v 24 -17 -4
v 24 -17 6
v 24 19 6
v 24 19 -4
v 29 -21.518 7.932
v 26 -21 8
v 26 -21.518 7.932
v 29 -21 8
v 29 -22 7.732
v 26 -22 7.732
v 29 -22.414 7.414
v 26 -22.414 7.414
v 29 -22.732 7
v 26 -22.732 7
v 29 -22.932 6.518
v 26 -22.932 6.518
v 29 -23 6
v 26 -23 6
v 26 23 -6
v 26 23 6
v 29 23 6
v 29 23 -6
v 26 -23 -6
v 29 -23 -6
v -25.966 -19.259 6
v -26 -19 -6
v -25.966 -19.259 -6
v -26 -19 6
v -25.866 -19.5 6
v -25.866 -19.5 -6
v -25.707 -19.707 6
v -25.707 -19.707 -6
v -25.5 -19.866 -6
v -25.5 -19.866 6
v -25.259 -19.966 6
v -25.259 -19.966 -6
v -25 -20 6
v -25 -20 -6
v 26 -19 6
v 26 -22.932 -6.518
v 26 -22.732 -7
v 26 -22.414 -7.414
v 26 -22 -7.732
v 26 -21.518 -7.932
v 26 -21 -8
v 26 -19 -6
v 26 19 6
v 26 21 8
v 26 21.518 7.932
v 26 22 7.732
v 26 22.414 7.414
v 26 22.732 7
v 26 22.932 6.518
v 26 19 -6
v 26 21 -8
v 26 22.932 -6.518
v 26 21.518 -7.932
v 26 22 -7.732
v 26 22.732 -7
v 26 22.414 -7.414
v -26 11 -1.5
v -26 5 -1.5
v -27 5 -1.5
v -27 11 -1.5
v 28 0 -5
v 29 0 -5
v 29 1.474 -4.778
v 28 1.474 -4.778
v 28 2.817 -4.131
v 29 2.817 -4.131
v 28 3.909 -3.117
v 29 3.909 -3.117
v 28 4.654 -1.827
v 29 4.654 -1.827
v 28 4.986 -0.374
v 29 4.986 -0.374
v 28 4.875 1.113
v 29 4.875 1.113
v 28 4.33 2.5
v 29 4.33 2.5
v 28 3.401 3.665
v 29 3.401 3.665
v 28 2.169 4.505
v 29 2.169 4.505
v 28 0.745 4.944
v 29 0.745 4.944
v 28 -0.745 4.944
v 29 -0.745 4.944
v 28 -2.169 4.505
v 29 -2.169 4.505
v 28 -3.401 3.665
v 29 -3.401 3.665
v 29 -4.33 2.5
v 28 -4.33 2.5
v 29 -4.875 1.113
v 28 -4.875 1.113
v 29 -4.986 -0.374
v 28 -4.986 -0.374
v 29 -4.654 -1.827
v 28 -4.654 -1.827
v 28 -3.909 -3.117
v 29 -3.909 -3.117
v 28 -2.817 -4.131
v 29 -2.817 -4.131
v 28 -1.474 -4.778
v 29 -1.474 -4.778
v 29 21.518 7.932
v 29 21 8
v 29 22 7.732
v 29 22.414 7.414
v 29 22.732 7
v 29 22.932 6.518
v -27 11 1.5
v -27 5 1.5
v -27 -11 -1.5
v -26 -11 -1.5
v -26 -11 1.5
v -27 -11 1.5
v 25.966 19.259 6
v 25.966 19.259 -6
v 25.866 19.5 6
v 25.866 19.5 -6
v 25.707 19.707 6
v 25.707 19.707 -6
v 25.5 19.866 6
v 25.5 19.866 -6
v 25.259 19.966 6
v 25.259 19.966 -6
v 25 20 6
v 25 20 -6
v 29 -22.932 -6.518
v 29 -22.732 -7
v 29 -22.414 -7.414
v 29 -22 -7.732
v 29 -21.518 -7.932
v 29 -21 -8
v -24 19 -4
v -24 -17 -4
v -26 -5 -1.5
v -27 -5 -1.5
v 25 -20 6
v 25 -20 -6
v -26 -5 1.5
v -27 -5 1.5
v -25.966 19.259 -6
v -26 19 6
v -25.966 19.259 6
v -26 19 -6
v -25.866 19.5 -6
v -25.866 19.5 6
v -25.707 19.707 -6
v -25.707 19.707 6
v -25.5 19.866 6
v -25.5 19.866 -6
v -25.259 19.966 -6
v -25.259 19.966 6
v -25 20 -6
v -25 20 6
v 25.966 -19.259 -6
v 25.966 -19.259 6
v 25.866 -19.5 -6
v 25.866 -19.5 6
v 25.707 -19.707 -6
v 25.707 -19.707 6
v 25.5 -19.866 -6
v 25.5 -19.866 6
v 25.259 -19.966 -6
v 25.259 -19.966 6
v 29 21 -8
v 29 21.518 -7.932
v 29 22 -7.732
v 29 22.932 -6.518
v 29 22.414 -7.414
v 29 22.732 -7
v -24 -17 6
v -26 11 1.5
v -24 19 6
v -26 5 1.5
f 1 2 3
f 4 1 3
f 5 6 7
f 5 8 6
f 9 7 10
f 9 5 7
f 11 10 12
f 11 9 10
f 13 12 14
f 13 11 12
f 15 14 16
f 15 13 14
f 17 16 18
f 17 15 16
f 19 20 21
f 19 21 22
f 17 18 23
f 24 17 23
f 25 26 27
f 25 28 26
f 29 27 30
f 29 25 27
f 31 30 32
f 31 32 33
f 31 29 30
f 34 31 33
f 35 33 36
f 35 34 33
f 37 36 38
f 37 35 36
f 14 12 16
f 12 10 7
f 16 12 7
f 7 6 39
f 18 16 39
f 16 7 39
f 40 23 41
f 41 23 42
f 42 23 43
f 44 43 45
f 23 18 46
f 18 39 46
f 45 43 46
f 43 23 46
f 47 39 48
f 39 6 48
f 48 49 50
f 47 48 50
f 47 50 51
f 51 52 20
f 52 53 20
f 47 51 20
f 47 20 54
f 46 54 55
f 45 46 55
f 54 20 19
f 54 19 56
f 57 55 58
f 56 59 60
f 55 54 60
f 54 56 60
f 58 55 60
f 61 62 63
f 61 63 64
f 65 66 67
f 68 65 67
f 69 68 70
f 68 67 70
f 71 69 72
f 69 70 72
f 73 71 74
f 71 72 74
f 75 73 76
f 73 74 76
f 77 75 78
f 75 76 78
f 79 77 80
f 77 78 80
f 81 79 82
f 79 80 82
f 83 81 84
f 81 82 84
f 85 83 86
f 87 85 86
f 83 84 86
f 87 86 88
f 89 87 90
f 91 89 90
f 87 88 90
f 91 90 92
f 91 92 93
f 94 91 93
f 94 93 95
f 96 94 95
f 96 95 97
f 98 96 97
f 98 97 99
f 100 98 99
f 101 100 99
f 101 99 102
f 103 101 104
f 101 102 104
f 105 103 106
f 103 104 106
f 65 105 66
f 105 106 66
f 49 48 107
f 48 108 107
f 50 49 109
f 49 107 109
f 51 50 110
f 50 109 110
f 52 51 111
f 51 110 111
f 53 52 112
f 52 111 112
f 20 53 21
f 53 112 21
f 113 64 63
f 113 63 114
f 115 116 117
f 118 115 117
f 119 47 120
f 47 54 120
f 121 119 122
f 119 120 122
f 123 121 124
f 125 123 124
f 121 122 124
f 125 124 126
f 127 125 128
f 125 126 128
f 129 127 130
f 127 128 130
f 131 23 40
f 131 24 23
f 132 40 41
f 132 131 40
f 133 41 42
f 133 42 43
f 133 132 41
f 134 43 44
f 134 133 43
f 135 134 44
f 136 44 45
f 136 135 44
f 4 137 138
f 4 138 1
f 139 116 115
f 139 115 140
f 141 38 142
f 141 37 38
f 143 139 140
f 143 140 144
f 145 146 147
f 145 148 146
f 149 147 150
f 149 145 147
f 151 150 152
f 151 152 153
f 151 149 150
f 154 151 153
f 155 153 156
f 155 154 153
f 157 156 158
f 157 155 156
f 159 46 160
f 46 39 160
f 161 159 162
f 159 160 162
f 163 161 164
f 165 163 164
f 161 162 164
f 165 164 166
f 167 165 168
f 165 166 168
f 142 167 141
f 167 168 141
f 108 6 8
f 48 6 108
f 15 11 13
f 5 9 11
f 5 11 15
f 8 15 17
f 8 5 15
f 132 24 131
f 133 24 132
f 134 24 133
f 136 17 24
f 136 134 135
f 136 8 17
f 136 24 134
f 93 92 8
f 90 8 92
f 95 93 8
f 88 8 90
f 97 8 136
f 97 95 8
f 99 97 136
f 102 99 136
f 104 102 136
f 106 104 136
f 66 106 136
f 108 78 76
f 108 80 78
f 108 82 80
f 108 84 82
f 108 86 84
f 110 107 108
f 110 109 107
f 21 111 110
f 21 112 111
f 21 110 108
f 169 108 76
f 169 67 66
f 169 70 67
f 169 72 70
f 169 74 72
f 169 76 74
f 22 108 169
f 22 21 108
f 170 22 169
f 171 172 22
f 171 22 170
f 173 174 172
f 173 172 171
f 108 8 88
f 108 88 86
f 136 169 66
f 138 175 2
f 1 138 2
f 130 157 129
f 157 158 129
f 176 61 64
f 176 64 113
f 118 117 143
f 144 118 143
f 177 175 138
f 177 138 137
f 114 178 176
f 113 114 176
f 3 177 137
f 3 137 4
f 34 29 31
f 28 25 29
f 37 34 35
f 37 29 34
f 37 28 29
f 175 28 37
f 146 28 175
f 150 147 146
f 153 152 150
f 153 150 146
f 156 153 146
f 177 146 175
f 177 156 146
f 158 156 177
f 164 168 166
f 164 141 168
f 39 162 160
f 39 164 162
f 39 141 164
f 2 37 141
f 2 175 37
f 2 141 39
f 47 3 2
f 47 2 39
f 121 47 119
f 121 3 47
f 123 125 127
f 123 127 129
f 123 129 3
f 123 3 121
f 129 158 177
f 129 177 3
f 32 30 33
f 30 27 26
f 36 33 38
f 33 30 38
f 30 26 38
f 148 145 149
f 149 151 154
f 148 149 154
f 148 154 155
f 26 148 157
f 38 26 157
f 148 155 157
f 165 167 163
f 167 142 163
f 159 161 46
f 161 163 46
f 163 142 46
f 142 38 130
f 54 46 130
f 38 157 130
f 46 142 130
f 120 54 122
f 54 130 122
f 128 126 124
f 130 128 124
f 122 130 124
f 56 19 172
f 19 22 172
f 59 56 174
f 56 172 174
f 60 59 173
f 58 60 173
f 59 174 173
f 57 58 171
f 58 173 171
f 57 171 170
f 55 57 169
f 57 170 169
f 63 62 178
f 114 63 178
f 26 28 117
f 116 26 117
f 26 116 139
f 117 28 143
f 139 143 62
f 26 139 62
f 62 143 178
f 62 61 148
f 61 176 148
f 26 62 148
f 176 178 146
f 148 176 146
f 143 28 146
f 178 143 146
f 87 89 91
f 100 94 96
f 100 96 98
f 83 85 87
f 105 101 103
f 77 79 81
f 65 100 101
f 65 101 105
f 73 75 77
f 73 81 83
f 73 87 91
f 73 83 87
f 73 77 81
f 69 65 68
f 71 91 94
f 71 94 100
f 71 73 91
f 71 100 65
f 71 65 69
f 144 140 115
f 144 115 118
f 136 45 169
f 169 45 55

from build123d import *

# Parameters (mm, degrees)
SKETCH1_W           = 52
SKETCH1_H           = 40
BOSS_EXTRUDE1_DEPTH = 6
FILLET1_R           = 1
SKETCH2_W           = 48
SKETCH2_H           = 36
CUT_EXTRUDE1_DEPTH  = 10
SKETCH3_W           = 16
SKETCH3_H           = 46
BOSS_EXTRUDE2_DEPTH = 3
FILLET2_R           = 2
SKETCH4_R           = 5
CUT_EXTRUDE2_DEPTH  = 1
SKETCH5_W           = 3
SKETCH5_H           = 6
BOSS_EXTRUDE3_DEPTH = 1


with BuildPart() as part:
    # Sketch1 → Boss-Extrude1 (new, symmetric)
    with BuildSketch(Plane.XY):
        Rectangle(SKETCH1_W, SKETCH1_H)
    extrude(amount=BOSS_EXTRUDE1_DEPTH, both=True)

    # Fillet1
    fillet1_edges = [part.edges().sort_by_distance(p)[0] for p in [
        (-26, 20, 0),
        (26, 20, 0),
        (26, -20, 0),
        (-26, -20, 0),
    ]]
    fillet(fillet1_edges, radius=FILLET1_R)

    # Sketch2 → Cut-Extrude1 (cut)
    with BuildSketch(Plane.XY.offset(6)):
        with Locations((0, 1)):
            Rectangle(SKETCH2_W, SKETCH2_H)
    extrude(amount=-CUT_EXTRUDE1_DEPTH, mode=Mode.SUBTRACT)

    # Sketch3 → Boss-Extrude2 (add)
    with BuildSketch(Plane(origin=(26.00000007, 0, 0), x_dir=(0, 0, -1), z_dir=(1, 0, 0))):
        Rectangle(SKETCH3_W, SKETCH3_H)
    extrude(amount=BOSS_EXTRUDE2_DEPTH)

    # Fillet2
    fillet2_edges = [part.edges().sort_by_distance(p)[0] for p in [
        (27.50000007, 23, 8),
        (27.50000007, -23, 8),
        (27.50000007, -23, -8),
        (27.50000007, 23, -8),
    ]]
    fillet(fillet2_edges, radius=FILLET2_R)

    # Sketch4 → Cut-Extrude2 (cut)
    with BuildSketch(Plane(origin=(29.00000007, 0, 0), x_dir=(0, 0, -1), z_dir=(1, 0, 0))):
        Circle(SKETCH4_R)
    extrude(amount=-CUT_EXTRUDE2_DEPTH, mode=Mode.SUBTRACT)

    # Sketch5 → Boss-Extrude3 (add)
    with BuildSketch(Plane.ZY.offset(26)):
        with Locations((0, 8)):
            Rectangle(SKETCH5_W, SKETCH5_H)
        with Locations((0, -8)):
            Rectangle(SKETCH5_W, SKETCH5_H)
    extrude(amount=BOSS_EXTRUDE3_DEPTH)


solid = part.part
